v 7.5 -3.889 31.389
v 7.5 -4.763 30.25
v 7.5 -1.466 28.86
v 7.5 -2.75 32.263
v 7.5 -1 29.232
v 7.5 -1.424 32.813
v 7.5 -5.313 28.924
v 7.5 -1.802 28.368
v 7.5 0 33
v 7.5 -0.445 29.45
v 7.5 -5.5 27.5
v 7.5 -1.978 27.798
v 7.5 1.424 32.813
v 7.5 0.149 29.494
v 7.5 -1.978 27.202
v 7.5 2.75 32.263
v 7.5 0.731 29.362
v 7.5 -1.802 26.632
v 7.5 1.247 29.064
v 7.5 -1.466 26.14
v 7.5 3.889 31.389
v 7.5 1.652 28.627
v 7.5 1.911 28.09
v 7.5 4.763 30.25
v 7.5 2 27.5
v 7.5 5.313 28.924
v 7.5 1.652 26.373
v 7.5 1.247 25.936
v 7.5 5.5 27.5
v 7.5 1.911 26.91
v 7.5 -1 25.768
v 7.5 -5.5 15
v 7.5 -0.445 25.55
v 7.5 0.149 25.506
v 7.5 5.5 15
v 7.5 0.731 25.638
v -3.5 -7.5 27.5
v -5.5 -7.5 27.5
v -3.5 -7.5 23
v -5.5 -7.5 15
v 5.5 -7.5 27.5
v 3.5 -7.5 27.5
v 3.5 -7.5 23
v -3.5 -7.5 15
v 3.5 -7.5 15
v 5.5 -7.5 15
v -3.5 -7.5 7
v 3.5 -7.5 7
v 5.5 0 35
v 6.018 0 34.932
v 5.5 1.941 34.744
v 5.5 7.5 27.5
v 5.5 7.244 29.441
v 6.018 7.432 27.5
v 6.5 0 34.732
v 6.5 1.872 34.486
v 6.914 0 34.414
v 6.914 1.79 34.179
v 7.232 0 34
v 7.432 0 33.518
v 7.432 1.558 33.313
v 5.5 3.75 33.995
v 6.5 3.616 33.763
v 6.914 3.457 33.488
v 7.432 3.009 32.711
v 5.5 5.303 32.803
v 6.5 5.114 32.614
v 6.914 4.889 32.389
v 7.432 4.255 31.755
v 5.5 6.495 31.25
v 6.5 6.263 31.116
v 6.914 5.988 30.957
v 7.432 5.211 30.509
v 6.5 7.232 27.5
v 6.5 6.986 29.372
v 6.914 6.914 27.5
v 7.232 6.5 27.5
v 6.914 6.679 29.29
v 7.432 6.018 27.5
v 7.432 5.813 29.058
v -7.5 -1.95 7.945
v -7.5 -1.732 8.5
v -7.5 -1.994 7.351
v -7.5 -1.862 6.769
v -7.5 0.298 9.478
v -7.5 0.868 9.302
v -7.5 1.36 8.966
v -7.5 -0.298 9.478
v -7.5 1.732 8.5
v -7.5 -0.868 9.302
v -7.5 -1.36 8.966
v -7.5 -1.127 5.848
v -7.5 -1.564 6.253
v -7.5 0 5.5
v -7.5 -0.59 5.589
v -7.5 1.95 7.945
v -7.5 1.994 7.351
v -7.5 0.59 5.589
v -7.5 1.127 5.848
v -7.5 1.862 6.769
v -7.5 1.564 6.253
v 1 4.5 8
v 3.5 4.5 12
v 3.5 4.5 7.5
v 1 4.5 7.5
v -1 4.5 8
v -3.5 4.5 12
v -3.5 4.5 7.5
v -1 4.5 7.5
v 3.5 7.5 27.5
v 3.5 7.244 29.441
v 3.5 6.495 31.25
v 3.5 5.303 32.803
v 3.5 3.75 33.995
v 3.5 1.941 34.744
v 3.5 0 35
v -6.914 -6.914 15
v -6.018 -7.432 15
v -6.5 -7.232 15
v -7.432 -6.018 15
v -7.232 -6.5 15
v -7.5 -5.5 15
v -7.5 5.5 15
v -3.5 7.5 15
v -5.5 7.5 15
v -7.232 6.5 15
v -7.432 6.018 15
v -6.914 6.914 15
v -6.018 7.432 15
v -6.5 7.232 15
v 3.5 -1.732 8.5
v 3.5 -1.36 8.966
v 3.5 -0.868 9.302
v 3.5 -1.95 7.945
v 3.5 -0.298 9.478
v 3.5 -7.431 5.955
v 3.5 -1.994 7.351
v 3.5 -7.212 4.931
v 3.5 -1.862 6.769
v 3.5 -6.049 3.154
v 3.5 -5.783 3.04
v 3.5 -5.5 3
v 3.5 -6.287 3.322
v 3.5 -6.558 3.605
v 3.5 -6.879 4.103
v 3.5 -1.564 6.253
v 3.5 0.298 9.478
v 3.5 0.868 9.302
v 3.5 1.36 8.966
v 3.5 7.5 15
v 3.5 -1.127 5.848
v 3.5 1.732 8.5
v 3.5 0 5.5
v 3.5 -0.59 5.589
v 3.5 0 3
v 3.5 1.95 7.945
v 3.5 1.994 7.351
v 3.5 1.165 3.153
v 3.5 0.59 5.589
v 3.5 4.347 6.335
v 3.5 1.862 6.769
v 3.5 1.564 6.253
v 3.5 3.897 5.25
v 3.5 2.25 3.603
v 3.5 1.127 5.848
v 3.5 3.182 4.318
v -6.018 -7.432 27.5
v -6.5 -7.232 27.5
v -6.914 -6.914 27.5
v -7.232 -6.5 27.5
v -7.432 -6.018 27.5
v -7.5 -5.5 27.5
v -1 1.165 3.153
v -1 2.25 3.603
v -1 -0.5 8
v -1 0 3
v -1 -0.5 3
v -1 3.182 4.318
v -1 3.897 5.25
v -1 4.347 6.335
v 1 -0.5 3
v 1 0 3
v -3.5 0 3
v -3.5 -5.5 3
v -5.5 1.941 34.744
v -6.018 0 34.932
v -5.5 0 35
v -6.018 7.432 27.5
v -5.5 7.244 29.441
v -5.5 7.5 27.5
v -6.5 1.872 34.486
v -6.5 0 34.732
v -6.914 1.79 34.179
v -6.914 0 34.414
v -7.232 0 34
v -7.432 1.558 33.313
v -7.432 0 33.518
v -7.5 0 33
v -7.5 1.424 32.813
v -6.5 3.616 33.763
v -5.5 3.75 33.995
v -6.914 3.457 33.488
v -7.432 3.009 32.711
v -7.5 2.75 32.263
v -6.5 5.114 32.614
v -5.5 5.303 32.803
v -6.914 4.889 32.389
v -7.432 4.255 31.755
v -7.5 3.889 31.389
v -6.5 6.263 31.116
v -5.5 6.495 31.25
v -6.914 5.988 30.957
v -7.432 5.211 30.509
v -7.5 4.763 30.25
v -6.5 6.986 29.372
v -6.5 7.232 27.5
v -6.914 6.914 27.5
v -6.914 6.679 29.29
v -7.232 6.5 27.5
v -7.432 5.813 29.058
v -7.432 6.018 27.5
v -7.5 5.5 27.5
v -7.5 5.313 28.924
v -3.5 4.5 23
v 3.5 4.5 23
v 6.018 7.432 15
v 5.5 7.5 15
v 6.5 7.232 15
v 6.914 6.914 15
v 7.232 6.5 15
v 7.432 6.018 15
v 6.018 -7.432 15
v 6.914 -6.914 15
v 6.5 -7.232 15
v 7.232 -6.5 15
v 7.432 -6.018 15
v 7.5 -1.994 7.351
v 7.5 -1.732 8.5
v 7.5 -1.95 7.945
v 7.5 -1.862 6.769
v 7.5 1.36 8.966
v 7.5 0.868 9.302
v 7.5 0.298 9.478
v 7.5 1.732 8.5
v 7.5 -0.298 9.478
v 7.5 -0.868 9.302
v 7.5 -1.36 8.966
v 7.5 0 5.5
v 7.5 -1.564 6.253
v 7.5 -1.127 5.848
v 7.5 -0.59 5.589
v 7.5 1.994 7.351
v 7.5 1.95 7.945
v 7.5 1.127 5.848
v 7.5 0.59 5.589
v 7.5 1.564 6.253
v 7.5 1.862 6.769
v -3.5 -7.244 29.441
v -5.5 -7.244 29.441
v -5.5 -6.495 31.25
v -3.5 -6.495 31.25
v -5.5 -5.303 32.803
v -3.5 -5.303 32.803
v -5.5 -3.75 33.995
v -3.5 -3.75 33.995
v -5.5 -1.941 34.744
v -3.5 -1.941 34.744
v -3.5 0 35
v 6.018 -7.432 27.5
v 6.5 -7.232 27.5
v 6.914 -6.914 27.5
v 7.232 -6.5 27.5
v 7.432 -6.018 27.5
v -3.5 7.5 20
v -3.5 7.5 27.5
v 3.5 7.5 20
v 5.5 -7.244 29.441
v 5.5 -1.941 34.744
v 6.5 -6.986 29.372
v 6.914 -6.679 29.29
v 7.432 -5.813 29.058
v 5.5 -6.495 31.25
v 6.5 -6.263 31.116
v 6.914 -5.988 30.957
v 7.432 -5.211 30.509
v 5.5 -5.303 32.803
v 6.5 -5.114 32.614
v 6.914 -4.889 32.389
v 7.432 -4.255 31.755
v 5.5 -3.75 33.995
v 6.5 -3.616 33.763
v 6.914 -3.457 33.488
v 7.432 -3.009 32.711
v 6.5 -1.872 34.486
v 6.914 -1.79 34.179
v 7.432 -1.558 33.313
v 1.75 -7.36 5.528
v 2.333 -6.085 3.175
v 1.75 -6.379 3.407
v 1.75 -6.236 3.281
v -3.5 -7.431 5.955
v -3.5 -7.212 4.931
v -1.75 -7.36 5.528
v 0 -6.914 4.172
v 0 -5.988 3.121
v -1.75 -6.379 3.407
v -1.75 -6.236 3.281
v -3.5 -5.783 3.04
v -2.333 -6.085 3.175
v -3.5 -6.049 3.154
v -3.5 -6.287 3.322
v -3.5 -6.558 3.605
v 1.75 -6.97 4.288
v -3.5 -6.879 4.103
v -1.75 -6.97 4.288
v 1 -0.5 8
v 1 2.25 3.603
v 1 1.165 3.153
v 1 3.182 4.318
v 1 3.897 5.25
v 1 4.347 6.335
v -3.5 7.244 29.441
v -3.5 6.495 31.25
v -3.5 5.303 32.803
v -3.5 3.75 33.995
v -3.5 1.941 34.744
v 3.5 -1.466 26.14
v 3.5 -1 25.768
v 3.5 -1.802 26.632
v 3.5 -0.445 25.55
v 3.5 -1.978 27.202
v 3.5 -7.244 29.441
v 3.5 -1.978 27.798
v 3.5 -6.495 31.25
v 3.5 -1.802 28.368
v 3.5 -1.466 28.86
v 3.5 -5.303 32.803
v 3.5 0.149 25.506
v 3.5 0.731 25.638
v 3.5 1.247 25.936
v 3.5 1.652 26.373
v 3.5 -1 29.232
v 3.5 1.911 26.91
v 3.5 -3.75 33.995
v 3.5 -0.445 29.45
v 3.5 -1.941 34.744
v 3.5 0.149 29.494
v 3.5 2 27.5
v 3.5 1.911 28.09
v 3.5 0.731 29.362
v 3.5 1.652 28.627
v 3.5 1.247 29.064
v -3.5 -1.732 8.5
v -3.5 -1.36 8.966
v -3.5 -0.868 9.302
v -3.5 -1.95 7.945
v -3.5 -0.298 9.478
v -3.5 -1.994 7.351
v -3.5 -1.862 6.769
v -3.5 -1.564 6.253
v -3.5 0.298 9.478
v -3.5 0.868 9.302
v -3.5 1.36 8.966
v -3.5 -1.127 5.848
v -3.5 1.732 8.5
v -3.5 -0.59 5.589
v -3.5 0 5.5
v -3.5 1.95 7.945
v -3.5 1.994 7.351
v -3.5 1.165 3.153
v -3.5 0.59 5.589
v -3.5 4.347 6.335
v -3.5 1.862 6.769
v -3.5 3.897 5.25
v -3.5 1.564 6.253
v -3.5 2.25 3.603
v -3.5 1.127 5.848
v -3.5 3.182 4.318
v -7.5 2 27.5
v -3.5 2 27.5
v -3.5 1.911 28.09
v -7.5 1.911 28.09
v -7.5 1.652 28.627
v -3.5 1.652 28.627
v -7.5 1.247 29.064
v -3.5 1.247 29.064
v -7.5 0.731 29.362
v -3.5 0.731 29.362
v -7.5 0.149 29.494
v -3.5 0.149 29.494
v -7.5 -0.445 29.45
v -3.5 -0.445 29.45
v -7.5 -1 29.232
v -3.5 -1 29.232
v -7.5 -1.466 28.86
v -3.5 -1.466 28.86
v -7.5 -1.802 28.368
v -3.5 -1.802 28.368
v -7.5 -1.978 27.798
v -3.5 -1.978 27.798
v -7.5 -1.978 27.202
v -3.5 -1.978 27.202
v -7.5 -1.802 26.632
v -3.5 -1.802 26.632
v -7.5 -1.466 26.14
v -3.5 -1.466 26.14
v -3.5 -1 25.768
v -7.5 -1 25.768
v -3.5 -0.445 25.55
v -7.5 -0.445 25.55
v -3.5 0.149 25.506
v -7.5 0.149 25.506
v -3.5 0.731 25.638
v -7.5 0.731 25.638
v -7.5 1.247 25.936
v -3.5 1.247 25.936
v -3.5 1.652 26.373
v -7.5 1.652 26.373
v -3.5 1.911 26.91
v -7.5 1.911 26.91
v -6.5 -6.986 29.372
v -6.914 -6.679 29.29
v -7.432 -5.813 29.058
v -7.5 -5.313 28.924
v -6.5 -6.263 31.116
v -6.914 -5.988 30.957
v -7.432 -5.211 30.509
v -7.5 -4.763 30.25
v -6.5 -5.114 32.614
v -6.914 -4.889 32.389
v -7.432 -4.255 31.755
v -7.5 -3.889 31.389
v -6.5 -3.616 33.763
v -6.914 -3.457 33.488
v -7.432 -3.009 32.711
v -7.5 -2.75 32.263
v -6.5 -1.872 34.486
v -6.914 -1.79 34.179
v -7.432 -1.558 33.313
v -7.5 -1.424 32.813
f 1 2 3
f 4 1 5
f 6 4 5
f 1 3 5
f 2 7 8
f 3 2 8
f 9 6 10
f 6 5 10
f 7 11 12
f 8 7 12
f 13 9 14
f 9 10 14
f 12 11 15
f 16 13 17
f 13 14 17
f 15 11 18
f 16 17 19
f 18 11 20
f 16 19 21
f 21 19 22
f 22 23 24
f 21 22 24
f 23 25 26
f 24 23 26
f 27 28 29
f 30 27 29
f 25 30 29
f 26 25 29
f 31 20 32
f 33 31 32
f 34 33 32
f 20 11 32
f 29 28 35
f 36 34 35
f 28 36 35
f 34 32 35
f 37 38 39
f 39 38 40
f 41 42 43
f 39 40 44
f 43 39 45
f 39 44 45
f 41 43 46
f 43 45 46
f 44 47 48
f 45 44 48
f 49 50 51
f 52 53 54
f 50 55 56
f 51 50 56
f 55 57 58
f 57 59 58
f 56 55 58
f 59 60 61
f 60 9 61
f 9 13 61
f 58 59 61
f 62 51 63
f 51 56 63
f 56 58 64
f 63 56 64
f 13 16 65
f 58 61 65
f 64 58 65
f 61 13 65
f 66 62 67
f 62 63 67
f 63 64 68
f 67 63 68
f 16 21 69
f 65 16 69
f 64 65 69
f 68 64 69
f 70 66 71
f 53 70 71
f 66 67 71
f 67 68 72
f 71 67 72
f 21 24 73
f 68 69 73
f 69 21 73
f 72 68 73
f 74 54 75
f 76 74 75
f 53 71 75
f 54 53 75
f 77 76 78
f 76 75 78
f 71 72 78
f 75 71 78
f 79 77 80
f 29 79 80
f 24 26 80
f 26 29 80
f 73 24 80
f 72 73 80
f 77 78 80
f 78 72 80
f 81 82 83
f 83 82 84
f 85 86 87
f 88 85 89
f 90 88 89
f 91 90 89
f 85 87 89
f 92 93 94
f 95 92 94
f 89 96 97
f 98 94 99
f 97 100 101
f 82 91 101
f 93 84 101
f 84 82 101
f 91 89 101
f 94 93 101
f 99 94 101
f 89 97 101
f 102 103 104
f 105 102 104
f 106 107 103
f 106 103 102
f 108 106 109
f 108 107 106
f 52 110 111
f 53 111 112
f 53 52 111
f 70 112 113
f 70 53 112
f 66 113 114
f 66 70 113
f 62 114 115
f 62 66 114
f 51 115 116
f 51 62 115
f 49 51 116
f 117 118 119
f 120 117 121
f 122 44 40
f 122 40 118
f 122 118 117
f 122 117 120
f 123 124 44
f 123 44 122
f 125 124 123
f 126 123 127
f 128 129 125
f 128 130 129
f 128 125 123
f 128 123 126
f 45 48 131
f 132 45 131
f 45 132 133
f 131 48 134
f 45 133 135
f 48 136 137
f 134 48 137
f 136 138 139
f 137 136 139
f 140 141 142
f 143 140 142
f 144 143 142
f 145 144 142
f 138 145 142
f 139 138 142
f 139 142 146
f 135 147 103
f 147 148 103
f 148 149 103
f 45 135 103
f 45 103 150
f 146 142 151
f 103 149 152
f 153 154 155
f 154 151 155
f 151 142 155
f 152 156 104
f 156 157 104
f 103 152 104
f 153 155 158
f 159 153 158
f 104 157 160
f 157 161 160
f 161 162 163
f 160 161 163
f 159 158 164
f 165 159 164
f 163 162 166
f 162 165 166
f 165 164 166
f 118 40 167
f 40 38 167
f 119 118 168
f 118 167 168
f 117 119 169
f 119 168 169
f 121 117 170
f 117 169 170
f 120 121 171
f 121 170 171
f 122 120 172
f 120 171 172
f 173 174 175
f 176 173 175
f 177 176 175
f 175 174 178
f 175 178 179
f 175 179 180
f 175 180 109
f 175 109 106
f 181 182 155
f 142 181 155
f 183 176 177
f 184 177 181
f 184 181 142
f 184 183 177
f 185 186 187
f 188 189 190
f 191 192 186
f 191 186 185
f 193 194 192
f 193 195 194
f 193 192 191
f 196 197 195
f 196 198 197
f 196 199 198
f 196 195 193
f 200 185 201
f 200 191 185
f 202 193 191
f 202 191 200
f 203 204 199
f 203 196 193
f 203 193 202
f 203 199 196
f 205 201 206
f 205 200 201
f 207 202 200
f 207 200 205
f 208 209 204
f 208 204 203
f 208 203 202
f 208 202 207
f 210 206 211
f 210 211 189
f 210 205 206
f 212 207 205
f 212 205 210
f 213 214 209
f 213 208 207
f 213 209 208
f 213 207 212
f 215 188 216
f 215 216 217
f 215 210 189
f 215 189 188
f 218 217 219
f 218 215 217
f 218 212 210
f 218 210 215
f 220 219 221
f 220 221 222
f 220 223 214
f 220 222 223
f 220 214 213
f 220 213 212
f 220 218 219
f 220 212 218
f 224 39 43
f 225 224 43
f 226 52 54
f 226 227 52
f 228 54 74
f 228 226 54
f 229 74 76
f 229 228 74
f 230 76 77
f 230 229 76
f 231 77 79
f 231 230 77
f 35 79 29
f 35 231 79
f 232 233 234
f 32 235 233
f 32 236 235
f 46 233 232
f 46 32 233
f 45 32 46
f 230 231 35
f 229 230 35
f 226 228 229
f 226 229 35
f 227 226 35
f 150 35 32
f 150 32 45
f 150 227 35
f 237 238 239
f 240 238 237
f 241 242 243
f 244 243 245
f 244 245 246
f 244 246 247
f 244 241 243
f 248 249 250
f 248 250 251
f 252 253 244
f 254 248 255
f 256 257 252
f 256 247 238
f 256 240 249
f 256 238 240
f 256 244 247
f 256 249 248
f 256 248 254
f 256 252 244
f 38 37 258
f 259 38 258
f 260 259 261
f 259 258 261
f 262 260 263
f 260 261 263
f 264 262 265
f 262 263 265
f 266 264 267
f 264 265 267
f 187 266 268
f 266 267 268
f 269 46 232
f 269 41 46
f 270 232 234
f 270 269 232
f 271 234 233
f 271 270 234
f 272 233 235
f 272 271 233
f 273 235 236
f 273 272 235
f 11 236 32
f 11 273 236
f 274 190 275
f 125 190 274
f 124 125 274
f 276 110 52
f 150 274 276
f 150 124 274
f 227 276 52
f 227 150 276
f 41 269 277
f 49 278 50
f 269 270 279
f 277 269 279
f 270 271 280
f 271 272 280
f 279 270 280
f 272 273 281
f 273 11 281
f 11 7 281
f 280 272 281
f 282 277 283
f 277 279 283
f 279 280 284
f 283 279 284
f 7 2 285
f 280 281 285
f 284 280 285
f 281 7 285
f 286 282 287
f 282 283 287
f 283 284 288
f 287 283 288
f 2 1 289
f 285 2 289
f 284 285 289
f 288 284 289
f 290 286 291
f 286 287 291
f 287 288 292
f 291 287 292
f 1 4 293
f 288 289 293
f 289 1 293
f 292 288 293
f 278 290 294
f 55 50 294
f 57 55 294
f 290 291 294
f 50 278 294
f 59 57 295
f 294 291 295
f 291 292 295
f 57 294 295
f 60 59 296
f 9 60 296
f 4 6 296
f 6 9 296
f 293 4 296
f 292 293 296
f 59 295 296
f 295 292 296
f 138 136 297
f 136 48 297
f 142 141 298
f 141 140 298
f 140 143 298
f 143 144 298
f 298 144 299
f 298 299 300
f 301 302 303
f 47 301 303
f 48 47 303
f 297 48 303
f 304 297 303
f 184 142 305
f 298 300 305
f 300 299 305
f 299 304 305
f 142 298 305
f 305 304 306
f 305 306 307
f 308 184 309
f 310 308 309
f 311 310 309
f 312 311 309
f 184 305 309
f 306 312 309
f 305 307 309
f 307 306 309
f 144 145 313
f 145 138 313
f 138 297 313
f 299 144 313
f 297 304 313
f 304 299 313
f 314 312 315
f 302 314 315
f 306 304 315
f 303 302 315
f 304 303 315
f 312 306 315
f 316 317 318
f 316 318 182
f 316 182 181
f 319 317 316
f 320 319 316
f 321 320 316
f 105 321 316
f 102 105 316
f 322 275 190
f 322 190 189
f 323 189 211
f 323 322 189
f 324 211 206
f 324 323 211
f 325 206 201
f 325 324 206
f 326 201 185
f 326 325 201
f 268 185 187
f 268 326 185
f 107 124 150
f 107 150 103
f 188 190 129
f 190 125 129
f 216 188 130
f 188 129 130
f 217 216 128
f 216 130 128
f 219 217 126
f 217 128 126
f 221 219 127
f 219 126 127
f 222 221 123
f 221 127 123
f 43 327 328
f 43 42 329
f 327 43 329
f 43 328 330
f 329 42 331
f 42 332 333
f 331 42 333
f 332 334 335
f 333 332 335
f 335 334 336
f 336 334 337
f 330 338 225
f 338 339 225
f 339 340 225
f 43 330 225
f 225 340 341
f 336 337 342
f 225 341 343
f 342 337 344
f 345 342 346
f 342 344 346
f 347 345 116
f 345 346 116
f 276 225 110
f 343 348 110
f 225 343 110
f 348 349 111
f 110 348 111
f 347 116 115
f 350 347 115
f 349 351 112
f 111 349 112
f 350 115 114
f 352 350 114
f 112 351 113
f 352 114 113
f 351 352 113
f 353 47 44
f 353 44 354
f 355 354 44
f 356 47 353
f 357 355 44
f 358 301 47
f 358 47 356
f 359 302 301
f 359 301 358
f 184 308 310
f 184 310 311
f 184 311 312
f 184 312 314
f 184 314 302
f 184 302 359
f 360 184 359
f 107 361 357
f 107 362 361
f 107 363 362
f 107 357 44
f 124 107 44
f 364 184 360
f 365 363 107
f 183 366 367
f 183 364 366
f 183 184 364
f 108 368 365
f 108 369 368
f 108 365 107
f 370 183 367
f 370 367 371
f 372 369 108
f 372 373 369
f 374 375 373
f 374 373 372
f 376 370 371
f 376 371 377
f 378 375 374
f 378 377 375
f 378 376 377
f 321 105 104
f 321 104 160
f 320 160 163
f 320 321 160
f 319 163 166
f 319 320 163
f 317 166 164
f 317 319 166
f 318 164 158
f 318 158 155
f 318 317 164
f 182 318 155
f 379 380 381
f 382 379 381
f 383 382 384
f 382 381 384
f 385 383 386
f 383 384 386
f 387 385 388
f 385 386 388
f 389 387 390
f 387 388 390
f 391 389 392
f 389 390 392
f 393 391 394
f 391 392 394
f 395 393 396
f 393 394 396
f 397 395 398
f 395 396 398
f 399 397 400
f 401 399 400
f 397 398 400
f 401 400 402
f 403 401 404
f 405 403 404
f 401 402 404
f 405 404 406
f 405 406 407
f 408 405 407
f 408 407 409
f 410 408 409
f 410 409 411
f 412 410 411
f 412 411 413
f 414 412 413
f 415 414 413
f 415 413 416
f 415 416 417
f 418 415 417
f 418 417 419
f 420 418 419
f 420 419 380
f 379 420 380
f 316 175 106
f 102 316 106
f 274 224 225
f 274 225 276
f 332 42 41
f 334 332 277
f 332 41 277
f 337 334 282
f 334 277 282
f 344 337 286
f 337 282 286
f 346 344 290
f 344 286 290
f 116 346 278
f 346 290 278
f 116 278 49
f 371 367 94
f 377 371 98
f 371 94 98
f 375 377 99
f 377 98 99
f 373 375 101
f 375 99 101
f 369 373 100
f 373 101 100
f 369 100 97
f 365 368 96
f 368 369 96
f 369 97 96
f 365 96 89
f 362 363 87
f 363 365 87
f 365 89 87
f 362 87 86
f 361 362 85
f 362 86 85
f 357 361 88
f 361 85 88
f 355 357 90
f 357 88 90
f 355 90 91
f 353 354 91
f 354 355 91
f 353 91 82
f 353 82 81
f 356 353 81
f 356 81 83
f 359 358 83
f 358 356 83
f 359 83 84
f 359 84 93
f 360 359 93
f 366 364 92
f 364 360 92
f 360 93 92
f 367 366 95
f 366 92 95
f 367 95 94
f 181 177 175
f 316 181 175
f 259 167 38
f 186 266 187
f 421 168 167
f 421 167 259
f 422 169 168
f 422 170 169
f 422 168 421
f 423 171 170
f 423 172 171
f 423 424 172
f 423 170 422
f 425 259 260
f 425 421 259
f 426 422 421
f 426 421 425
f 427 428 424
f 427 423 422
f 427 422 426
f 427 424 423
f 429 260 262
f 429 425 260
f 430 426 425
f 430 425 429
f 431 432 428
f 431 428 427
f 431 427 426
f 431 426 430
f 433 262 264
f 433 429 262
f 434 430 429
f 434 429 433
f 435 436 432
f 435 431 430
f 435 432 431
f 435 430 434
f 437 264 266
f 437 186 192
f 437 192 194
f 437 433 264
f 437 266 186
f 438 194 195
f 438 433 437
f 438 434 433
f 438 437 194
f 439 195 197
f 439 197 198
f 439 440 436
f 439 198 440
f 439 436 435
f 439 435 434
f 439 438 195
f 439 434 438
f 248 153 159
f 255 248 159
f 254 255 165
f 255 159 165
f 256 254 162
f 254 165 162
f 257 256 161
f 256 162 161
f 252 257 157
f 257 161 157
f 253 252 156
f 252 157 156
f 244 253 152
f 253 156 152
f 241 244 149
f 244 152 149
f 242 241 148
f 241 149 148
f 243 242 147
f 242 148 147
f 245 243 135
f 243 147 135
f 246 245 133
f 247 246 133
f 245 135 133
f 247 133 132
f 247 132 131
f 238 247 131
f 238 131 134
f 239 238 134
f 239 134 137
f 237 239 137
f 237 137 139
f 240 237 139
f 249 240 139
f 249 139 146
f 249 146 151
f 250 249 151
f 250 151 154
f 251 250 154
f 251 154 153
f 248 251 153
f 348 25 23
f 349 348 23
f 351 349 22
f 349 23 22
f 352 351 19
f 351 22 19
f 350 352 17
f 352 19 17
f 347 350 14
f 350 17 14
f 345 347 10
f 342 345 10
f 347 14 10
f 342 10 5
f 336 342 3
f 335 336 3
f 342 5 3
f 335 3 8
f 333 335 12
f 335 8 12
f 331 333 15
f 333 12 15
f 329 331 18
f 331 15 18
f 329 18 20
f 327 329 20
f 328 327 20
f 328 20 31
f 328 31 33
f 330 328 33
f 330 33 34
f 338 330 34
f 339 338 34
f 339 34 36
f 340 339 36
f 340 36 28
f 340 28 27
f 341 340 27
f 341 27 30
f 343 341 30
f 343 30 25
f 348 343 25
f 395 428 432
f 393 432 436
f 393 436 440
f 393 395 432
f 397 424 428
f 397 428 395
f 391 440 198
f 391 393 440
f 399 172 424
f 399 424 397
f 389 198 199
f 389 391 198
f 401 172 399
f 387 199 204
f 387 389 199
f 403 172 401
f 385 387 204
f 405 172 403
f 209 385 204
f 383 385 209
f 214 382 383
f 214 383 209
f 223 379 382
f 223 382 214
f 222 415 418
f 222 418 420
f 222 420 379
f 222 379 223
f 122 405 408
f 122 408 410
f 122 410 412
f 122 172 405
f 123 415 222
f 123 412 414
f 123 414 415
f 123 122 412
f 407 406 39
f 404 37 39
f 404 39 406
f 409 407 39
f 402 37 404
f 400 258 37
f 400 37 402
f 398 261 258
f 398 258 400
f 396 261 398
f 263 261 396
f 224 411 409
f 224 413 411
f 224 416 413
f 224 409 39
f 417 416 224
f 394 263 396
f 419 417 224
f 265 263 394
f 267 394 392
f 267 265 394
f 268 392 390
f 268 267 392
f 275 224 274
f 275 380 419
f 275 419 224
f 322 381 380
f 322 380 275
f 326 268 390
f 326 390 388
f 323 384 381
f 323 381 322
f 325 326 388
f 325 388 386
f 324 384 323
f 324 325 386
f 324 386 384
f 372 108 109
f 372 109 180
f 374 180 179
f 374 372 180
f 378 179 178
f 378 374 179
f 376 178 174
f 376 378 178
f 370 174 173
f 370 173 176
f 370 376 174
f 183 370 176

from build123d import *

# Parameters (mm, degrees)
SKETCH1_W                = 15
SKETCH1_H                = 15
BOSS_EXTRUDE1_DEPTH      = 35
SKETCH3_W                = 7
SKETCH3_H                = 15
CUT_EXTRUDE1_DEPTH       = 12
SKETCH4_R                = 2
CUT_EXTRUDE2_DEPTH       = 15
SKETCH5_W                = 4
SKETCH5_H                = 15
CUT_EXTRUDE3_DEPTH       = 15
BOSS_EXTRUDE2_DEPTH      = 7.5
BOSS_EXTRUDE2_DEPTH_BACK = 7.5
SKETCH6_R                = 2
FILLET1_R                = 7.5
CUT_EXTRUDE6_DEPTH       = 3.5
CUT_EXTRUDE6_DEPTH_BACK  = 3.5
FILLET2_R                = 2
CUT_EXTRUDE7_DEPTH       = 7.5
CUT_EXTRUDE7_DEPTH_BACK  = 7.5
FILLET3_SIZE             = 4
FILLET3_SIZE_2           = 2
CUT_EXTRUDE8_DEPTH       = 1
CUT_EXTRUDE8_DEPTH_BACK  = 1


# Some blends are built 0.0001 mm under size
with BuildPart() as part:
    # Sketch1 → Boss-Extrude1 (new body)
    with BuildSketch(Plane.XY):
        Rectangle(SKETCH1_W, SKETCH1_H)
    extrude(amount=BOSS_EXTRUDE1_DEPTH)

    # Sketch3 → Cut-Extrude1 (cut)
    with BuildSketch(Plane.XY.offset(35)):
        Rectangle(SKETCH3_W, SKETCH3_H)
    extrude(amount=-CUT_EXTRUDE1_DEPTH, mode=Mode.SUBTRACT)

    # Sketch4 → Cut-Extrude2 (cut)
    with BuildSketch(Plane(origin=(7.5, 0, 0), x_dir=(0, 0, -1), z_dir=(1, 0, 0))):
        with Locations(Location((-27.5, 0, 0), (0, 0, 90))):
            Circle(SKETCH4_R)
    extrude(amount=-CUT_EXTRUDE2_DEPTH, mode=Mode.SUBTRACT)

    # Sketch5 → Cut-Extrude3 (cut)
    with BuildSketch(Plane(origin=(0, 0, 0), x_dir=(-1, 0, 0), z_dir=(0, 0, -1))):
        with Locations((-5.5, 0)):
            Rectangle(SKETCH5_W, SKETCH5_H)
        with Locations((5.5, 0)):
            Rectangle(SKETCH5_W, SKETCH5_H)
    extrude(amount=-CUT_EXTRUDE3_DEPTH, mode=Mode.SUBTRACT)

    # Sketch6 → Boss-Extrude2 (add, two sides: drawn at the far end of the back side and taken through both)
    with BuildSketch(Plane(origin=(0, 0, 0), x_dir=(0, 0, -1), z_dir=(1, 0, 0)).offset(-BOSS_EXTRUDE2_DEPTH_BACK)):
        with Locations((-7.5, 0)):
            Circle(SKETCH6_R)
    extrude(amount=BOSS_EXTRUDE2_DEPTH + BOSS_EXTRUDE2_DEPTH_BACK)

    # Fillet1
    fillet1_edges = [part.edges().sort_by_distance(p)[0] for p in [
        (5.5, -7.5, 35),
        (-5.5, -7.5, 35),
        (-5.5, 7.5, 35),
        (5.5, 7.5, 35),
    ]]
    fillet(fillet1_edges, radius=FILLET1_R - 0.0001)  # a hair under: the kernel refuses the full size

    # Sketch7 → Cut-Extrude6 (cut, two sides: drawn at the far end of the back side and taken through both)
    with BuildSketch(Plane(origin=(0, 0, 0), x_dir=(0, 0, -1), z_dir=(1, 0, 0)).offset(-CUT_EXTRUDE6_DEPTH_BACK)):
        Polygon((-23, 7.5), (-23, 4.5), (-20, 7.5), align=None)
    extrude(amount=CUT_EXTRUDE6_DEPTH + CUT_EXTRUDE6_DEPTH_BACK, mode=Mode.SUBTRACT)

    # Fillet2
    fillet2_edges = [part.edges().sort_by_distance(p)[0] for p in [
        (7.5, -7.5, 21.25005),
        (7.5, 7.5, 21.25005),
        (7.5, 5.303330148, 32.803330148),
        (7.5, -5.303330148, 32.803330148),
        (-7.5, -7.5, 21.25005),
        (-7.5, 7.5, 21.25005),
        (-7.5, 5.303330148, 32.803330148),
        (-7.5, -5.303330148, 32.803330148),
    ]]
    fillet(fillet2_edges, radius=FILLET2_R)

    # Sketch8 → Cut-Extrude7 (cut, two sides: drawn at the far end of the back side and taken through both)
    with BuildSketch(Plane(origin=(0, 0, 0), x_dir=(0, 0, -1), z_dir=(1, 0, 0)).offset(-CUT_EXTRUDE7_DEPTH_BACK)):
        with BuildLine():
            Line((-15, 7.5), (-12, 4.5))
            Line((-12, 4.5), (-7.5, 4.5))
            ThreePointArc((-7.5, 4.5), (-4.318019485, 3.181980515), (-3, 0))
            Line((-3, 0), (-3, -7.5))
            Line((-3, -7.5), (0, -7.5))
            Line((0, -7.5), (0, 7.5))
            Line((0, 7.5), (-15, 7.5))
        make_face()
    extrude(amount=CUT_EXTRUDE7_DEPTH + CUT_EXTRUDE7_DEPTH_BACK, mode=Mode.SUBTRACT)

    # Fillet3
    # an asymmetric fillet: 4, 2 mm, written as the material it takes off along each edge
    with BuildSketch(Plane(origin=(-13.5, -7.5, 3), x_dir=(0, 0, 1), z_dir=(1, 0, 0))) as fillet3_piece_1:
        with BuildLine():
            Bezier((FILLET3_SIZE, 0), (0, 0), (0, -FILLET3_SIZE_2), weights=[1, 0.707106781, 1])
            Line((0, -FILLET3_SIZE_2), (0, 0))
            Line((0, 0), (FILLET3_SIZE, 0))
        make_face()
    extrude(amount=27, mode=Mode.SUBTRACT)

    # Sketch9 → Cut-Extrude8 (cut, two sides: drawn at the far end of the back side and taken through both)
    with BuildSketch(Plane(origin=(0, 0, 0), x_dir=(0, 0, -1), z_dir=(1, 0, 0)).offset(-CUT_EXTRUDE8_DEPTH_BACK)):
        with BuildLine():
            Line((-8, -0.5), (-8, 9.147620524))
            ThreePointArc((-8, 9.147620524), (-1.178102105, 6.321897895), (1.647620524, -0.5))
            Line((1.647620524, -0.5), (-8, -0.5))
        make_face()
    extrude(amount=CUT_EXTRUDE8_DEPTH + CUT_EXTRUDE8_DEPTH_BACK, mode=Mode.SUBTRACT)


solid = part.part
